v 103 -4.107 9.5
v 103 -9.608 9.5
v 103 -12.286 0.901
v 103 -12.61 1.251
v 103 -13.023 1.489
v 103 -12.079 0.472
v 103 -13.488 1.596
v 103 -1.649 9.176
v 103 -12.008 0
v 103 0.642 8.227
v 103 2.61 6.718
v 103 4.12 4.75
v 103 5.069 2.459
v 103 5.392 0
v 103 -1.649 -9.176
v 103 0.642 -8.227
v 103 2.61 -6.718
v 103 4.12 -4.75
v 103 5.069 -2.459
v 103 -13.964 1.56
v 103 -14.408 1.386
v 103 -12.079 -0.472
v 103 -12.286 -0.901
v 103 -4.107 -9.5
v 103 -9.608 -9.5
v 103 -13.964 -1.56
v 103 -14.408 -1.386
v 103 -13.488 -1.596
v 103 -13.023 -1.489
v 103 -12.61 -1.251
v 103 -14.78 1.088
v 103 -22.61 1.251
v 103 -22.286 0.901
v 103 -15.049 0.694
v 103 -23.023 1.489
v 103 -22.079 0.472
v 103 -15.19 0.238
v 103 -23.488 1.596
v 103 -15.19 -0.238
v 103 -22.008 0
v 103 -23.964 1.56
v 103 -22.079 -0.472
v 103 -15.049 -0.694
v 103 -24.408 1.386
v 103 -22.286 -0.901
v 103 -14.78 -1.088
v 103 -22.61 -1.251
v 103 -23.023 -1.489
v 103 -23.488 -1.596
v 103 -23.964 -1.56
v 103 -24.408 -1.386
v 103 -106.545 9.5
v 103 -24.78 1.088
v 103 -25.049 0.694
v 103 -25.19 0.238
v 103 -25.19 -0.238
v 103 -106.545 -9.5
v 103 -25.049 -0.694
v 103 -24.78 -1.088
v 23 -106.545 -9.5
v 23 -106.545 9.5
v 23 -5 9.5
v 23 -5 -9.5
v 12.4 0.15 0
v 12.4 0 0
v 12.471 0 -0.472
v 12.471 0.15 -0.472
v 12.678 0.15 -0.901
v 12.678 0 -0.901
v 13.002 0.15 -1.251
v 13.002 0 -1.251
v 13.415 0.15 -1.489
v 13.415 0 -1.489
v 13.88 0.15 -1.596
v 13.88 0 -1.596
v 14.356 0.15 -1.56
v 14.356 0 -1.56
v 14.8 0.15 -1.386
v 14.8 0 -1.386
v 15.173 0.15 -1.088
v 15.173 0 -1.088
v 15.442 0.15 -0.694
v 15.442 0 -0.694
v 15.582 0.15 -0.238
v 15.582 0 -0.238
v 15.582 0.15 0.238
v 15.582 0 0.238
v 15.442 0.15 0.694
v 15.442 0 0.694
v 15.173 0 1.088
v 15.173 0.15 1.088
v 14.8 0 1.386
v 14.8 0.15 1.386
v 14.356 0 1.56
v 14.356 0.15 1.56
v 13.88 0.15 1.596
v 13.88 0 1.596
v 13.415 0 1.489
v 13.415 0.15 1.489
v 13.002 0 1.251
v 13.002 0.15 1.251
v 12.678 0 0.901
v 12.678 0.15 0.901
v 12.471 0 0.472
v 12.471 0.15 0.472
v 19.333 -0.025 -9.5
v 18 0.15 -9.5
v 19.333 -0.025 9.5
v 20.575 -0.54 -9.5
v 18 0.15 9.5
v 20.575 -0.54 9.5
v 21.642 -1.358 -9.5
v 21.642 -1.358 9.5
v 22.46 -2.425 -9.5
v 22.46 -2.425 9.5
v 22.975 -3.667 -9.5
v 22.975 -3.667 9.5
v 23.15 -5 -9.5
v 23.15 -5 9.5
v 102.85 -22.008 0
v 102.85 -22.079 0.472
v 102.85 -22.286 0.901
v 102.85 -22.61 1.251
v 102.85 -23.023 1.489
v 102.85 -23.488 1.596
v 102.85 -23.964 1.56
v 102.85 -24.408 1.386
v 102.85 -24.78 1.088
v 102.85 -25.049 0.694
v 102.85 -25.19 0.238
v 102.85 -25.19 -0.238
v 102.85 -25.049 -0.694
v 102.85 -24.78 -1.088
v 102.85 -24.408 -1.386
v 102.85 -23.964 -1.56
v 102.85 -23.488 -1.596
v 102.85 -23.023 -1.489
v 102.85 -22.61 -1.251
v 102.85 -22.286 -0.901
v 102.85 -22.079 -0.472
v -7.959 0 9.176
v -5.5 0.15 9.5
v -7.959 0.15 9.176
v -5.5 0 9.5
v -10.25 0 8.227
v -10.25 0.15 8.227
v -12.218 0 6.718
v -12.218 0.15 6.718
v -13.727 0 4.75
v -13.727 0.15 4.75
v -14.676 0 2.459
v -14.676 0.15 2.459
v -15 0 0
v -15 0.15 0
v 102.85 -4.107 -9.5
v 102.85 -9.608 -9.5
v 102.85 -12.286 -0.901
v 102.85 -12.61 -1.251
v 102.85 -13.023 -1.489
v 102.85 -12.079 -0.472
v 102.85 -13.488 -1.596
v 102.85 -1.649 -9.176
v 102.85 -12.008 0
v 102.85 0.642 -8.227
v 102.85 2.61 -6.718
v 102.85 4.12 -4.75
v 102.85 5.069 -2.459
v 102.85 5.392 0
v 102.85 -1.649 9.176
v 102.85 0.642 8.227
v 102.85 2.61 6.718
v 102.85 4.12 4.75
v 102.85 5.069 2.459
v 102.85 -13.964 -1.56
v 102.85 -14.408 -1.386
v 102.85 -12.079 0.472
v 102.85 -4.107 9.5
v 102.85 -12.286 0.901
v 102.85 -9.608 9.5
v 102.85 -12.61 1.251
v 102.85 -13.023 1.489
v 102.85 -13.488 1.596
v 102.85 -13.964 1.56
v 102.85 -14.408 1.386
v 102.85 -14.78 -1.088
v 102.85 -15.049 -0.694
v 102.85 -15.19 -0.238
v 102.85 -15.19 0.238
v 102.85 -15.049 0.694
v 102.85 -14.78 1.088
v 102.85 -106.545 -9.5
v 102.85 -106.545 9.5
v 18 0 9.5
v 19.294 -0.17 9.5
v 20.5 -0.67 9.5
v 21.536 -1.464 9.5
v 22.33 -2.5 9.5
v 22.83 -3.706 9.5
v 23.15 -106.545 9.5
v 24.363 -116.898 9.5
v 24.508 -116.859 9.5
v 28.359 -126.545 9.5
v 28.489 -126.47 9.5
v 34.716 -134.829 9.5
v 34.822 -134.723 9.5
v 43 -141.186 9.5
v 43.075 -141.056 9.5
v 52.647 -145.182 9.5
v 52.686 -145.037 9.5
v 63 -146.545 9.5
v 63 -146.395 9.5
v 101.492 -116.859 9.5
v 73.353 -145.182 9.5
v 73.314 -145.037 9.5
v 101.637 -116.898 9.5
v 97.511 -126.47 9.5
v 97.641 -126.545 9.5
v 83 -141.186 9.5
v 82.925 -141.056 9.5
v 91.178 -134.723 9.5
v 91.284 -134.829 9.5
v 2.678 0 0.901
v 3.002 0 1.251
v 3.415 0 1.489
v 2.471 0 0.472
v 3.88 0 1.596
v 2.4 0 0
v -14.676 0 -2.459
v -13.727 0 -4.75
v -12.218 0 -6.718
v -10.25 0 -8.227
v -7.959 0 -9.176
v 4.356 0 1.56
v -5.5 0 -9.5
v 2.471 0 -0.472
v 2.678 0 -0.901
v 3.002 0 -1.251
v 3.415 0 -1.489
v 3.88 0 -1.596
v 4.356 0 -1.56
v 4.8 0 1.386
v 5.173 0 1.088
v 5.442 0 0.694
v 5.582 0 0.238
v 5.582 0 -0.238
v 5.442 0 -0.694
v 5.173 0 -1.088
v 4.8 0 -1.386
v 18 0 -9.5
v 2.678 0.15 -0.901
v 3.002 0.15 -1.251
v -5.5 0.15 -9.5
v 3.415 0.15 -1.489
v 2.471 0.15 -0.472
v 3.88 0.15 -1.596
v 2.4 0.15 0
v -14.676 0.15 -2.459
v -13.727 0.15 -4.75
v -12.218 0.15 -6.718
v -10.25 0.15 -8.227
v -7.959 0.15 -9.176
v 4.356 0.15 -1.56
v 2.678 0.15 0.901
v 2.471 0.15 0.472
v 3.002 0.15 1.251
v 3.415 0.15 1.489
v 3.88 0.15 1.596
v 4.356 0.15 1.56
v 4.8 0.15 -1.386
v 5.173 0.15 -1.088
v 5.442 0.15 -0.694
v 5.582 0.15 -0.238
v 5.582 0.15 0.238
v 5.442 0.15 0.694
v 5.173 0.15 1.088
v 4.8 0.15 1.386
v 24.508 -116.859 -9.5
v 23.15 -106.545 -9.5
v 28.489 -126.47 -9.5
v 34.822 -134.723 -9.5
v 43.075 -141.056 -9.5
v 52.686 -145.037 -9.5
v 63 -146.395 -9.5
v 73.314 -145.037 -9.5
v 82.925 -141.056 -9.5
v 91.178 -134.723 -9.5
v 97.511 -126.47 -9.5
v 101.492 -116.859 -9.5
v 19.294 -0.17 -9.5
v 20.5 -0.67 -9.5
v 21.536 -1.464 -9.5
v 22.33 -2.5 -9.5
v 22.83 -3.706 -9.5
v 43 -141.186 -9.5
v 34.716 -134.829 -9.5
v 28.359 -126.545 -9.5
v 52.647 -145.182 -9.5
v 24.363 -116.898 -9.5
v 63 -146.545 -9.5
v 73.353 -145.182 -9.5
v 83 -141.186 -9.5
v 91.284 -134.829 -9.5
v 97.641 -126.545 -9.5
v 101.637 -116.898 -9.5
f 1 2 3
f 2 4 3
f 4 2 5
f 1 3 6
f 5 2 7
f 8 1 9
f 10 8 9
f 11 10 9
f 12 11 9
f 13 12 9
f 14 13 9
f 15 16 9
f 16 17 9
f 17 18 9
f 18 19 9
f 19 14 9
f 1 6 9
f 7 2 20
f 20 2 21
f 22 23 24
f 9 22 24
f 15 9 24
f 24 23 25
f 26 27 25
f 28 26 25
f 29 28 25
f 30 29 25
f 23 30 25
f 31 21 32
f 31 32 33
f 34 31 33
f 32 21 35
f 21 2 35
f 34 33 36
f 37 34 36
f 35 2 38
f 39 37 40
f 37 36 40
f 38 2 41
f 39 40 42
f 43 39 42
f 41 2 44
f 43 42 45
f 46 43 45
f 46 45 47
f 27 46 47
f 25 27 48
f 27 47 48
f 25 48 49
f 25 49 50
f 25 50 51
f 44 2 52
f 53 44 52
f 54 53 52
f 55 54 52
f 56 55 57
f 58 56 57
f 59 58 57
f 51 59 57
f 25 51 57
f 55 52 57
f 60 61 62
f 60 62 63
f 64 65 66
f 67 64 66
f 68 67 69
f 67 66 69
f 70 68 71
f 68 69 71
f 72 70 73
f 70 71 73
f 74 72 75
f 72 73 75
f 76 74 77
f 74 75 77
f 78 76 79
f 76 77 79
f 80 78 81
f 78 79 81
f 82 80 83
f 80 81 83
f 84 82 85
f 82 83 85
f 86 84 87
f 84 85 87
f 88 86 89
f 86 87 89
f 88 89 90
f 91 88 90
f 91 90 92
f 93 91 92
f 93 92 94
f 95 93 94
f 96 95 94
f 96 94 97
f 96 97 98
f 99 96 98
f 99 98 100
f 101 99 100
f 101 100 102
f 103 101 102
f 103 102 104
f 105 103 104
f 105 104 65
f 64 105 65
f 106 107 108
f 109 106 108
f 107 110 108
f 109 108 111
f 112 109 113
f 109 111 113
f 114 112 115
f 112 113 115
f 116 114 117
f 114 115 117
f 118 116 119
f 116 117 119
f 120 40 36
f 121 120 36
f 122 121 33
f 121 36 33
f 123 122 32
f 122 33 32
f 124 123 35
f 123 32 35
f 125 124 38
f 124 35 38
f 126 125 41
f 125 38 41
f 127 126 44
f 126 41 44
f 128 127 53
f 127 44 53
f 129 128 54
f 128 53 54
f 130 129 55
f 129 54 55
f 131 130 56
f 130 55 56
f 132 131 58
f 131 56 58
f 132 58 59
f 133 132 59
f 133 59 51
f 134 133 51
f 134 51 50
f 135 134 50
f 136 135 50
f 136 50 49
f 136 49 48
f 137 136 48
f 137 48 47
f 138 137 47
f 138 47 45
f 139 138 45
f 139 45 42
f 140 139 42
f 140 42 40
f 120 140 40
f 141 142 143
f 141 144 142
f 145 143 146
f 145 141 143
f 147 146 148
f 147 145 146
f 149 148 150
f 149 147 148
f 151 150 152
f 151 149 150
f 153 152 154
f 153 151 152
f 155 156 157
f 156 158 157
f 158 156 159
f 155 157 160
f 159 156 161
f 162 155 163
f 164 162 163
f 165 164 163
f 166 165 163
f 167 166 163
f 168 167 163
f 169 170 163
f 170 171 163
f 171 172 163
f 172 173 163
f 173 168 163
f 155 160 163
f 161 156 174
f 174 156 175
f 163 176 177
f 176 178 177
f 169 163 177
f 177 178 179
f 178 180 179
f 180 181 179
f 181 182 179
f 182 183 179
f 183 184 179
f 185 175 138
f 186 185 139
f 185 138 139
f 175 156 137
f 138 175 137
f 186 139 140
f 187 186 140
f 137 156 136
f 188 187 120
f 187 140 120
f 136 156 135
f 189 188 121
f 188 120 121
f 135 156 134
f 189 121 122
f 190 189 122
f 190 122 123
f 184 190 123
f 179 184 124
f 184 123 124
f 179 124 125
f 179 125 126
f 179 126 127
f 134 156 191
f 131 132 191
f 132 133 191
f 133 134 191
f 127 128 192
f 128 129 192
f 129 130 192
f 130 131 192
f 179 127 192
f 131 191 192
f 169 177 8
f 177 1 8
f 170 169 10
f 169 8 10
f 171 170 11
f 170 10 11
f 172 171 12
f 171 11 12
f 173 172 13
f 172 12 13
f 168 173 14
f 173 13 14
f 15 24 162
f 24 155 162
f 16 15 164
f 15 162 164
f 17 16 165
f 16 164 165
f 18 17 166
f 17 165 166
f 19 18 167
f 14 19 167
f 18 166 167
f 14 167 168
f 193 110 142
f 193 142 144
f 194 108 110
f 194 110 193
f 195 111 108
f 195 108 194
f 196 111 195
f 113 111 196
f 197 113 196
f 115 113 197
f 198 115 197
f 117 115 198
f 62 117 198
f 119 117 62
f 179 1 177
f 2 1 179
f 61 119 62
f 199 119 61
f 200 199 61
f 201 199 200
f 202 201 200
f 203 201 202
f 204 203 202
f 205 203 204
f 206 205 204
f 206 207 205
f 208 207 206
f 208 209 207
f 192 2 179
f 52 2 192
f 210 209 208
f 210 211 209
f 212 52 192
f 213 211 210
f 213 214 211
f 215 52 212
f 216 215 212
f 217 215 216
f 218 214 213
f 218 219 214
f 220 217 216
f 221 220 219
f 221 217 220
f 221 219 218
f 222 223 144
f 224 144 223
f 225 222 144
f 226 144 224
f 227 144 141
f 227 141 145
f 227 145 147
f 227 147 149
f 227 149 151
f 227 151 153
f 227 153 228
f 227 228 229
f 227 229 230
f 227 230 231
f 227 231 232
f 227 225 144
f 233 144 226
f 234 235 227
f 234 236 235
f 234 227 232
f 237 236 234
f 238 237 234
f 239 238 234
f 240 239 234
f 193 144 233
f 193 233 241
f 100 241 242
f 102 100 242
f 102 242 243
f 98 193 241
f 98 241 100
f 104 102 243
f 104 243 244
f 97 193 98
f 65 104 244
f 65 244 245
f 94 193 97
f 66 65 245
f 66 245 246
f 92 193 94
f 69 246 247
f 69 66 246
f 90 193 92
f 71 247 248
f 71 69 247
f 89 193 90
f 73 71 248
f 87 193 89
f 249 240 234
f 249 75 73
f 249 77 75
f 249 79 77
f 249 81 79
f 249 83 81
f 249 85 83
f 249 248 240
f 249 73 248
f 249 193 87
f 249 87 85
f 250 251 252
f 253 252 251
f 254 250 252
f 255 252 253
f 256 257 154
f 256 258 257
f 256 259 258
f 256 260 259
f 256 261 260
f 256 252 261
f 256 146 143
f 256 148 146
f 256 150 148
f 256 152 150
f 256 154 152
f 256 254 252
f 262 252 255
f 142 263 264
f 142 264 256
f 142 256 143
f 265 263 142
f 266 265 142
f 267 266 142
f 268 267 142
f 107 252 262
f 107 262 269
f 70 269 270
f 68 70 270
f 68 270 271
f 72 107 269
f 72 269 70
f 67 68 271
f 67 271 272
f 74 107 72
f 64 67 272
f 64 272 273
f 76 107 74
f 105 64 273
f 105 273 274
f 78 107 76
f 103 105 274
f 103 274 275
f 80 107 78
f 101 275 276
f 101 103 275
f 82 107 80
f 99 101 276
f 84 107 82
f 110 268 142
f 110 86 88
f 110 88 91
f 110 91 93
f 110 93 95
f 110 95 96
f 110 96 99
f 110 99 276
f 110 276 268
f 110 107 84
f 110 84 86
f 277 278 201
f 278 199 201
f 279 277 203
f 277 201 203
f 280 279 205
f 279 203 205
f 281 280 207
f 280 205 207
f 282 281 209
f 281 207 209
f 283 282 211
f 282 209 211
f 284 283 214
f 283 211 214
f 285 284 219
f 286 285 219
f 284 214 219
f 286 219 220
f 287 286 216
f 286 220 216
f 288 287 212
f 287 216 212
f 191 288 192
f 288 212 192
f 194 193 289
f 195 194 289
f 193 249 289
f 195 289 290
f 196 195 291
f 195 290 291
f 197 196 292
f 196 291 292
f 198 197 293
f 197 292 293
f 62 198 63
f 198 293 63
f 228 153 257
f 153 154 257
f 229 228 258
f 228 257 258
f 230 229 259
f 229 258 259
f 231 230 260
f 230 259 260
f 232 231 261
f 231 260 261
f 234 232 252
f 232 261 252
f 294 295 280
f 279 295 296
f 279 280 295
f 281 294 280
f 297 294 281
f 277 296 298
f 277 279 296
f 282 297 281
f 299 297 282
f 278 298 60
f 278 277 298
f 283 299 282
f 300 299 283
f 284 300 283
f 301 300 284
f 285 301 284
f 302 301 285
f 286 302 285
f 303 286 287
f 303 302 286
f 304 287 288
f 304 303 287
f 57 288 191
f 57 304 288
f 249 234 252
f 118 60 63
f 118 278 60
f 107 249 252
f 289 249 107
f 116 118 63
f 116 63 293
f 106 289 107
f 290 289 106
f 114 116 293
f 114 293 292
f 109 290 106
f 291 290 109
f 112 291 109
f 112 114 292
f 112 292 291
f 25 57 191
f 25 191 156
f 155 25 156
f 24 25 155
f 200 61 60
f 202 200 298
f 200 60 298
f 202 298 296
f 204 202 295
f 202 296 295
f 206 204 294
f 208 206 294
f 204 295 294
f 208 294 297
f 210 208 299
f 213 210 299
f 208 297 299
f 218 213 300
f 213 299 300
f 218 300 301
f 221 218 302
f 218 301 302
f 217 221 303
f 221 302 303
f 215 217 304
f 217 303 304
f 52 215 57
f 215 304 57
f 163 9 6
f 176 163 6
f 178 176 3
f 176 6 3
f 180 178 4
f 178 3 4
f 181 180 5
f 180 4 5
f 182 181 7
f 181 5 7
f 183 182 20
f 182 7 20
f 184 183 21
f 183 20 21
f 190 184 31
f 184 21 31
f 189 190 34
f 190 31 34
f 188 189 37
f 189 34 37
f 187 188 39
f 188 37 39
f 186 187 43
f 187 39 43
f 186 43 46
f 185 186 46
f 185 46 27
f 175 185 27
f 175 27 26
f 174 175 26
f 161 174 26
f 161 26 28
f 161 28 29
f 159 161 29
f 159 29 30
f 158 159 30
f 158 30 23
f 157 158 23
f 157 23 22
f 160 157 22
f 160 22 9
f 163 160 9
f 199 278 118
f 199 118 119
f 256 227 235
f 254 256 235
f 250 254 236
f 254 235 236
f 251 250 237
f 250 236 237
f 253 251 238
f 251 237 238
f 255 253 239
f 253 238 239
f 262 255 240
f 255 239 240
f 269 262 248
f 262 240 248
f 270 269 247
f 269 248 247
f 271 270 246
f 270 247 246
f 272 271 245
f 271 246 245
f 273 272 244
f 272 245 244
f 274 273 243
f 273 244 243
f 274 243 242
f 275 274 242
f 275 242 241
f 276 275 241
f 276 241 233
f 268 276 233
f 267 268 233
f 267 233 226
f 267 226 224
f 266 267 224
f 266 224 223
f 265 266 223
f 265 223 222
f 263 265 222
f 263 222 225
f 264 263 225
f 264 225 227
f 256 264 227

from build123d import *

# Parameters (mm, degrees)
SKETCH2_W            = 19
SKETCH2_H            = 0.15
M3_CLEARANCE_HOLE1_D = 3.2
CUT_EXTRUDE1_REACH   = 181.373
SKETCH5_R            = 1.6
MOVE_FACE1_BY        = 15
MOVE_FACE1_2_BY      = 15
FILLET1_R            = 9.5


with BuildPart() as part:
    # Sweep1: sweep along a path in tape_measure_path
    with BuildLine(Plane.XY) as sweep1_path:
        Line((0, 0), (18, 0))
        ThreePointArc((18, 0), (21.535533906, -1.464466094), (23, -5))
        Line((23, -5), (23, -106.544934808))
        ThreePointArc((23, -106.544934808), (63, -146.544934808), (103, -106.544934808))
        Line((103, -106.544934808), (103, -9.607557393))
    # Sketch2 → Sweep1 (sweep)
    with BuildSketch(Plane(origin=(0, 0, 0), x_dir=(0, 0, -1), z_dir=(1, 0, 0))):
        with Locations((0, 0.075)):
            Rectangle(SKETCH2_W, SKETCH2_H)
    sweep(path=sweep1_path.line)

    # M3 Clearance Hole1 (through all)
    with Locations(Plane(origin=(0, 0.15, 0), x_dir=(1, 0, 0), z_dir=(0, 1, 0))):
        with Locations((4, 0), (14, 0)):
            Hole(M3_CLEARANCE_HOLE1_D / 2)

    # Sketch5 → Cut-Extrude1 (cut, up to next)
    with BuildSketch(Plane(origin=(103, 0, 0), x_dir=(0, 0, -1), z_dir=(1, 0, 0)), mode=Mode.PRIVATE) as cut_extrude1_sk1:
        with Locations(Location((0, -13.607557393, 0), (0, 0, 90))):
            Circle(SKETCH5_R)
    cut_extrude1_tool1 = extrude(cut_extrude1_sk1.sketch, amount=-CUT_EXTRUDE1_REACH, mode=Mode.PRIVATE) & part.part
    # Sketch5 → Cut-Extrude1 (cut, up to next)
    with BuildSketch(Plane(origin=(103, 0, 0), x_dir=(0, 0, -1), z_dir=(1, 0, 0)), mode=Mode.PRIVATE) as cut_extrude1_sk2:
        with Locations(Location((0, -23.607557393, 0), (0, 0, 90))):
            Circle(SKETCH5_R)
    cut_extrude1_tool2 = extrude(cut_extrude1_sk2.sketch, amount=-CUT_EXTRUDE1_REACH, mode=Mode.PRIVATE) & part.part
    add(cut_extrude1_tool1.solids().sort_by_distance((103, -13.607557, 0))[0], mode=Mode.SUBTRACT)
    add(cut_extrude1_tool2.solids().sort_by_distance((103, -23.607557, 0))[0], mode=Mode.SUBTRACT)

    # Move Face1: a face moved outward by 15.0
    extrude(part.faces().sort_by_distance((102.925, -9.607557393, 0))[0], amount=MOVE_FACE1_BY, dir=(0, 1, 0))

    # Move Face1 2: a face moved outward by 15.0
    extrude(part.faces().sort_by_distance((0, 0.075, 0))[0], amount=MOVE_FACE1_2_BY, dir=(-1, 0, 0))

    # Fillet1
    fillet1_edges = [part.edges().sort_by_distance(p)[0] for p in [
        (-15, 0.075, 9.5),
        (-15, 0.075, -9.5),
        (102.925, 5.392442607, 9.5),
        (102.925, 5.392442607, -9.5),
    ]]
    fillet(fillet1_edges, radius=FILLET1_R - 0.0001)  # a hair under: the kernel refuses the full size


solid = part.part
